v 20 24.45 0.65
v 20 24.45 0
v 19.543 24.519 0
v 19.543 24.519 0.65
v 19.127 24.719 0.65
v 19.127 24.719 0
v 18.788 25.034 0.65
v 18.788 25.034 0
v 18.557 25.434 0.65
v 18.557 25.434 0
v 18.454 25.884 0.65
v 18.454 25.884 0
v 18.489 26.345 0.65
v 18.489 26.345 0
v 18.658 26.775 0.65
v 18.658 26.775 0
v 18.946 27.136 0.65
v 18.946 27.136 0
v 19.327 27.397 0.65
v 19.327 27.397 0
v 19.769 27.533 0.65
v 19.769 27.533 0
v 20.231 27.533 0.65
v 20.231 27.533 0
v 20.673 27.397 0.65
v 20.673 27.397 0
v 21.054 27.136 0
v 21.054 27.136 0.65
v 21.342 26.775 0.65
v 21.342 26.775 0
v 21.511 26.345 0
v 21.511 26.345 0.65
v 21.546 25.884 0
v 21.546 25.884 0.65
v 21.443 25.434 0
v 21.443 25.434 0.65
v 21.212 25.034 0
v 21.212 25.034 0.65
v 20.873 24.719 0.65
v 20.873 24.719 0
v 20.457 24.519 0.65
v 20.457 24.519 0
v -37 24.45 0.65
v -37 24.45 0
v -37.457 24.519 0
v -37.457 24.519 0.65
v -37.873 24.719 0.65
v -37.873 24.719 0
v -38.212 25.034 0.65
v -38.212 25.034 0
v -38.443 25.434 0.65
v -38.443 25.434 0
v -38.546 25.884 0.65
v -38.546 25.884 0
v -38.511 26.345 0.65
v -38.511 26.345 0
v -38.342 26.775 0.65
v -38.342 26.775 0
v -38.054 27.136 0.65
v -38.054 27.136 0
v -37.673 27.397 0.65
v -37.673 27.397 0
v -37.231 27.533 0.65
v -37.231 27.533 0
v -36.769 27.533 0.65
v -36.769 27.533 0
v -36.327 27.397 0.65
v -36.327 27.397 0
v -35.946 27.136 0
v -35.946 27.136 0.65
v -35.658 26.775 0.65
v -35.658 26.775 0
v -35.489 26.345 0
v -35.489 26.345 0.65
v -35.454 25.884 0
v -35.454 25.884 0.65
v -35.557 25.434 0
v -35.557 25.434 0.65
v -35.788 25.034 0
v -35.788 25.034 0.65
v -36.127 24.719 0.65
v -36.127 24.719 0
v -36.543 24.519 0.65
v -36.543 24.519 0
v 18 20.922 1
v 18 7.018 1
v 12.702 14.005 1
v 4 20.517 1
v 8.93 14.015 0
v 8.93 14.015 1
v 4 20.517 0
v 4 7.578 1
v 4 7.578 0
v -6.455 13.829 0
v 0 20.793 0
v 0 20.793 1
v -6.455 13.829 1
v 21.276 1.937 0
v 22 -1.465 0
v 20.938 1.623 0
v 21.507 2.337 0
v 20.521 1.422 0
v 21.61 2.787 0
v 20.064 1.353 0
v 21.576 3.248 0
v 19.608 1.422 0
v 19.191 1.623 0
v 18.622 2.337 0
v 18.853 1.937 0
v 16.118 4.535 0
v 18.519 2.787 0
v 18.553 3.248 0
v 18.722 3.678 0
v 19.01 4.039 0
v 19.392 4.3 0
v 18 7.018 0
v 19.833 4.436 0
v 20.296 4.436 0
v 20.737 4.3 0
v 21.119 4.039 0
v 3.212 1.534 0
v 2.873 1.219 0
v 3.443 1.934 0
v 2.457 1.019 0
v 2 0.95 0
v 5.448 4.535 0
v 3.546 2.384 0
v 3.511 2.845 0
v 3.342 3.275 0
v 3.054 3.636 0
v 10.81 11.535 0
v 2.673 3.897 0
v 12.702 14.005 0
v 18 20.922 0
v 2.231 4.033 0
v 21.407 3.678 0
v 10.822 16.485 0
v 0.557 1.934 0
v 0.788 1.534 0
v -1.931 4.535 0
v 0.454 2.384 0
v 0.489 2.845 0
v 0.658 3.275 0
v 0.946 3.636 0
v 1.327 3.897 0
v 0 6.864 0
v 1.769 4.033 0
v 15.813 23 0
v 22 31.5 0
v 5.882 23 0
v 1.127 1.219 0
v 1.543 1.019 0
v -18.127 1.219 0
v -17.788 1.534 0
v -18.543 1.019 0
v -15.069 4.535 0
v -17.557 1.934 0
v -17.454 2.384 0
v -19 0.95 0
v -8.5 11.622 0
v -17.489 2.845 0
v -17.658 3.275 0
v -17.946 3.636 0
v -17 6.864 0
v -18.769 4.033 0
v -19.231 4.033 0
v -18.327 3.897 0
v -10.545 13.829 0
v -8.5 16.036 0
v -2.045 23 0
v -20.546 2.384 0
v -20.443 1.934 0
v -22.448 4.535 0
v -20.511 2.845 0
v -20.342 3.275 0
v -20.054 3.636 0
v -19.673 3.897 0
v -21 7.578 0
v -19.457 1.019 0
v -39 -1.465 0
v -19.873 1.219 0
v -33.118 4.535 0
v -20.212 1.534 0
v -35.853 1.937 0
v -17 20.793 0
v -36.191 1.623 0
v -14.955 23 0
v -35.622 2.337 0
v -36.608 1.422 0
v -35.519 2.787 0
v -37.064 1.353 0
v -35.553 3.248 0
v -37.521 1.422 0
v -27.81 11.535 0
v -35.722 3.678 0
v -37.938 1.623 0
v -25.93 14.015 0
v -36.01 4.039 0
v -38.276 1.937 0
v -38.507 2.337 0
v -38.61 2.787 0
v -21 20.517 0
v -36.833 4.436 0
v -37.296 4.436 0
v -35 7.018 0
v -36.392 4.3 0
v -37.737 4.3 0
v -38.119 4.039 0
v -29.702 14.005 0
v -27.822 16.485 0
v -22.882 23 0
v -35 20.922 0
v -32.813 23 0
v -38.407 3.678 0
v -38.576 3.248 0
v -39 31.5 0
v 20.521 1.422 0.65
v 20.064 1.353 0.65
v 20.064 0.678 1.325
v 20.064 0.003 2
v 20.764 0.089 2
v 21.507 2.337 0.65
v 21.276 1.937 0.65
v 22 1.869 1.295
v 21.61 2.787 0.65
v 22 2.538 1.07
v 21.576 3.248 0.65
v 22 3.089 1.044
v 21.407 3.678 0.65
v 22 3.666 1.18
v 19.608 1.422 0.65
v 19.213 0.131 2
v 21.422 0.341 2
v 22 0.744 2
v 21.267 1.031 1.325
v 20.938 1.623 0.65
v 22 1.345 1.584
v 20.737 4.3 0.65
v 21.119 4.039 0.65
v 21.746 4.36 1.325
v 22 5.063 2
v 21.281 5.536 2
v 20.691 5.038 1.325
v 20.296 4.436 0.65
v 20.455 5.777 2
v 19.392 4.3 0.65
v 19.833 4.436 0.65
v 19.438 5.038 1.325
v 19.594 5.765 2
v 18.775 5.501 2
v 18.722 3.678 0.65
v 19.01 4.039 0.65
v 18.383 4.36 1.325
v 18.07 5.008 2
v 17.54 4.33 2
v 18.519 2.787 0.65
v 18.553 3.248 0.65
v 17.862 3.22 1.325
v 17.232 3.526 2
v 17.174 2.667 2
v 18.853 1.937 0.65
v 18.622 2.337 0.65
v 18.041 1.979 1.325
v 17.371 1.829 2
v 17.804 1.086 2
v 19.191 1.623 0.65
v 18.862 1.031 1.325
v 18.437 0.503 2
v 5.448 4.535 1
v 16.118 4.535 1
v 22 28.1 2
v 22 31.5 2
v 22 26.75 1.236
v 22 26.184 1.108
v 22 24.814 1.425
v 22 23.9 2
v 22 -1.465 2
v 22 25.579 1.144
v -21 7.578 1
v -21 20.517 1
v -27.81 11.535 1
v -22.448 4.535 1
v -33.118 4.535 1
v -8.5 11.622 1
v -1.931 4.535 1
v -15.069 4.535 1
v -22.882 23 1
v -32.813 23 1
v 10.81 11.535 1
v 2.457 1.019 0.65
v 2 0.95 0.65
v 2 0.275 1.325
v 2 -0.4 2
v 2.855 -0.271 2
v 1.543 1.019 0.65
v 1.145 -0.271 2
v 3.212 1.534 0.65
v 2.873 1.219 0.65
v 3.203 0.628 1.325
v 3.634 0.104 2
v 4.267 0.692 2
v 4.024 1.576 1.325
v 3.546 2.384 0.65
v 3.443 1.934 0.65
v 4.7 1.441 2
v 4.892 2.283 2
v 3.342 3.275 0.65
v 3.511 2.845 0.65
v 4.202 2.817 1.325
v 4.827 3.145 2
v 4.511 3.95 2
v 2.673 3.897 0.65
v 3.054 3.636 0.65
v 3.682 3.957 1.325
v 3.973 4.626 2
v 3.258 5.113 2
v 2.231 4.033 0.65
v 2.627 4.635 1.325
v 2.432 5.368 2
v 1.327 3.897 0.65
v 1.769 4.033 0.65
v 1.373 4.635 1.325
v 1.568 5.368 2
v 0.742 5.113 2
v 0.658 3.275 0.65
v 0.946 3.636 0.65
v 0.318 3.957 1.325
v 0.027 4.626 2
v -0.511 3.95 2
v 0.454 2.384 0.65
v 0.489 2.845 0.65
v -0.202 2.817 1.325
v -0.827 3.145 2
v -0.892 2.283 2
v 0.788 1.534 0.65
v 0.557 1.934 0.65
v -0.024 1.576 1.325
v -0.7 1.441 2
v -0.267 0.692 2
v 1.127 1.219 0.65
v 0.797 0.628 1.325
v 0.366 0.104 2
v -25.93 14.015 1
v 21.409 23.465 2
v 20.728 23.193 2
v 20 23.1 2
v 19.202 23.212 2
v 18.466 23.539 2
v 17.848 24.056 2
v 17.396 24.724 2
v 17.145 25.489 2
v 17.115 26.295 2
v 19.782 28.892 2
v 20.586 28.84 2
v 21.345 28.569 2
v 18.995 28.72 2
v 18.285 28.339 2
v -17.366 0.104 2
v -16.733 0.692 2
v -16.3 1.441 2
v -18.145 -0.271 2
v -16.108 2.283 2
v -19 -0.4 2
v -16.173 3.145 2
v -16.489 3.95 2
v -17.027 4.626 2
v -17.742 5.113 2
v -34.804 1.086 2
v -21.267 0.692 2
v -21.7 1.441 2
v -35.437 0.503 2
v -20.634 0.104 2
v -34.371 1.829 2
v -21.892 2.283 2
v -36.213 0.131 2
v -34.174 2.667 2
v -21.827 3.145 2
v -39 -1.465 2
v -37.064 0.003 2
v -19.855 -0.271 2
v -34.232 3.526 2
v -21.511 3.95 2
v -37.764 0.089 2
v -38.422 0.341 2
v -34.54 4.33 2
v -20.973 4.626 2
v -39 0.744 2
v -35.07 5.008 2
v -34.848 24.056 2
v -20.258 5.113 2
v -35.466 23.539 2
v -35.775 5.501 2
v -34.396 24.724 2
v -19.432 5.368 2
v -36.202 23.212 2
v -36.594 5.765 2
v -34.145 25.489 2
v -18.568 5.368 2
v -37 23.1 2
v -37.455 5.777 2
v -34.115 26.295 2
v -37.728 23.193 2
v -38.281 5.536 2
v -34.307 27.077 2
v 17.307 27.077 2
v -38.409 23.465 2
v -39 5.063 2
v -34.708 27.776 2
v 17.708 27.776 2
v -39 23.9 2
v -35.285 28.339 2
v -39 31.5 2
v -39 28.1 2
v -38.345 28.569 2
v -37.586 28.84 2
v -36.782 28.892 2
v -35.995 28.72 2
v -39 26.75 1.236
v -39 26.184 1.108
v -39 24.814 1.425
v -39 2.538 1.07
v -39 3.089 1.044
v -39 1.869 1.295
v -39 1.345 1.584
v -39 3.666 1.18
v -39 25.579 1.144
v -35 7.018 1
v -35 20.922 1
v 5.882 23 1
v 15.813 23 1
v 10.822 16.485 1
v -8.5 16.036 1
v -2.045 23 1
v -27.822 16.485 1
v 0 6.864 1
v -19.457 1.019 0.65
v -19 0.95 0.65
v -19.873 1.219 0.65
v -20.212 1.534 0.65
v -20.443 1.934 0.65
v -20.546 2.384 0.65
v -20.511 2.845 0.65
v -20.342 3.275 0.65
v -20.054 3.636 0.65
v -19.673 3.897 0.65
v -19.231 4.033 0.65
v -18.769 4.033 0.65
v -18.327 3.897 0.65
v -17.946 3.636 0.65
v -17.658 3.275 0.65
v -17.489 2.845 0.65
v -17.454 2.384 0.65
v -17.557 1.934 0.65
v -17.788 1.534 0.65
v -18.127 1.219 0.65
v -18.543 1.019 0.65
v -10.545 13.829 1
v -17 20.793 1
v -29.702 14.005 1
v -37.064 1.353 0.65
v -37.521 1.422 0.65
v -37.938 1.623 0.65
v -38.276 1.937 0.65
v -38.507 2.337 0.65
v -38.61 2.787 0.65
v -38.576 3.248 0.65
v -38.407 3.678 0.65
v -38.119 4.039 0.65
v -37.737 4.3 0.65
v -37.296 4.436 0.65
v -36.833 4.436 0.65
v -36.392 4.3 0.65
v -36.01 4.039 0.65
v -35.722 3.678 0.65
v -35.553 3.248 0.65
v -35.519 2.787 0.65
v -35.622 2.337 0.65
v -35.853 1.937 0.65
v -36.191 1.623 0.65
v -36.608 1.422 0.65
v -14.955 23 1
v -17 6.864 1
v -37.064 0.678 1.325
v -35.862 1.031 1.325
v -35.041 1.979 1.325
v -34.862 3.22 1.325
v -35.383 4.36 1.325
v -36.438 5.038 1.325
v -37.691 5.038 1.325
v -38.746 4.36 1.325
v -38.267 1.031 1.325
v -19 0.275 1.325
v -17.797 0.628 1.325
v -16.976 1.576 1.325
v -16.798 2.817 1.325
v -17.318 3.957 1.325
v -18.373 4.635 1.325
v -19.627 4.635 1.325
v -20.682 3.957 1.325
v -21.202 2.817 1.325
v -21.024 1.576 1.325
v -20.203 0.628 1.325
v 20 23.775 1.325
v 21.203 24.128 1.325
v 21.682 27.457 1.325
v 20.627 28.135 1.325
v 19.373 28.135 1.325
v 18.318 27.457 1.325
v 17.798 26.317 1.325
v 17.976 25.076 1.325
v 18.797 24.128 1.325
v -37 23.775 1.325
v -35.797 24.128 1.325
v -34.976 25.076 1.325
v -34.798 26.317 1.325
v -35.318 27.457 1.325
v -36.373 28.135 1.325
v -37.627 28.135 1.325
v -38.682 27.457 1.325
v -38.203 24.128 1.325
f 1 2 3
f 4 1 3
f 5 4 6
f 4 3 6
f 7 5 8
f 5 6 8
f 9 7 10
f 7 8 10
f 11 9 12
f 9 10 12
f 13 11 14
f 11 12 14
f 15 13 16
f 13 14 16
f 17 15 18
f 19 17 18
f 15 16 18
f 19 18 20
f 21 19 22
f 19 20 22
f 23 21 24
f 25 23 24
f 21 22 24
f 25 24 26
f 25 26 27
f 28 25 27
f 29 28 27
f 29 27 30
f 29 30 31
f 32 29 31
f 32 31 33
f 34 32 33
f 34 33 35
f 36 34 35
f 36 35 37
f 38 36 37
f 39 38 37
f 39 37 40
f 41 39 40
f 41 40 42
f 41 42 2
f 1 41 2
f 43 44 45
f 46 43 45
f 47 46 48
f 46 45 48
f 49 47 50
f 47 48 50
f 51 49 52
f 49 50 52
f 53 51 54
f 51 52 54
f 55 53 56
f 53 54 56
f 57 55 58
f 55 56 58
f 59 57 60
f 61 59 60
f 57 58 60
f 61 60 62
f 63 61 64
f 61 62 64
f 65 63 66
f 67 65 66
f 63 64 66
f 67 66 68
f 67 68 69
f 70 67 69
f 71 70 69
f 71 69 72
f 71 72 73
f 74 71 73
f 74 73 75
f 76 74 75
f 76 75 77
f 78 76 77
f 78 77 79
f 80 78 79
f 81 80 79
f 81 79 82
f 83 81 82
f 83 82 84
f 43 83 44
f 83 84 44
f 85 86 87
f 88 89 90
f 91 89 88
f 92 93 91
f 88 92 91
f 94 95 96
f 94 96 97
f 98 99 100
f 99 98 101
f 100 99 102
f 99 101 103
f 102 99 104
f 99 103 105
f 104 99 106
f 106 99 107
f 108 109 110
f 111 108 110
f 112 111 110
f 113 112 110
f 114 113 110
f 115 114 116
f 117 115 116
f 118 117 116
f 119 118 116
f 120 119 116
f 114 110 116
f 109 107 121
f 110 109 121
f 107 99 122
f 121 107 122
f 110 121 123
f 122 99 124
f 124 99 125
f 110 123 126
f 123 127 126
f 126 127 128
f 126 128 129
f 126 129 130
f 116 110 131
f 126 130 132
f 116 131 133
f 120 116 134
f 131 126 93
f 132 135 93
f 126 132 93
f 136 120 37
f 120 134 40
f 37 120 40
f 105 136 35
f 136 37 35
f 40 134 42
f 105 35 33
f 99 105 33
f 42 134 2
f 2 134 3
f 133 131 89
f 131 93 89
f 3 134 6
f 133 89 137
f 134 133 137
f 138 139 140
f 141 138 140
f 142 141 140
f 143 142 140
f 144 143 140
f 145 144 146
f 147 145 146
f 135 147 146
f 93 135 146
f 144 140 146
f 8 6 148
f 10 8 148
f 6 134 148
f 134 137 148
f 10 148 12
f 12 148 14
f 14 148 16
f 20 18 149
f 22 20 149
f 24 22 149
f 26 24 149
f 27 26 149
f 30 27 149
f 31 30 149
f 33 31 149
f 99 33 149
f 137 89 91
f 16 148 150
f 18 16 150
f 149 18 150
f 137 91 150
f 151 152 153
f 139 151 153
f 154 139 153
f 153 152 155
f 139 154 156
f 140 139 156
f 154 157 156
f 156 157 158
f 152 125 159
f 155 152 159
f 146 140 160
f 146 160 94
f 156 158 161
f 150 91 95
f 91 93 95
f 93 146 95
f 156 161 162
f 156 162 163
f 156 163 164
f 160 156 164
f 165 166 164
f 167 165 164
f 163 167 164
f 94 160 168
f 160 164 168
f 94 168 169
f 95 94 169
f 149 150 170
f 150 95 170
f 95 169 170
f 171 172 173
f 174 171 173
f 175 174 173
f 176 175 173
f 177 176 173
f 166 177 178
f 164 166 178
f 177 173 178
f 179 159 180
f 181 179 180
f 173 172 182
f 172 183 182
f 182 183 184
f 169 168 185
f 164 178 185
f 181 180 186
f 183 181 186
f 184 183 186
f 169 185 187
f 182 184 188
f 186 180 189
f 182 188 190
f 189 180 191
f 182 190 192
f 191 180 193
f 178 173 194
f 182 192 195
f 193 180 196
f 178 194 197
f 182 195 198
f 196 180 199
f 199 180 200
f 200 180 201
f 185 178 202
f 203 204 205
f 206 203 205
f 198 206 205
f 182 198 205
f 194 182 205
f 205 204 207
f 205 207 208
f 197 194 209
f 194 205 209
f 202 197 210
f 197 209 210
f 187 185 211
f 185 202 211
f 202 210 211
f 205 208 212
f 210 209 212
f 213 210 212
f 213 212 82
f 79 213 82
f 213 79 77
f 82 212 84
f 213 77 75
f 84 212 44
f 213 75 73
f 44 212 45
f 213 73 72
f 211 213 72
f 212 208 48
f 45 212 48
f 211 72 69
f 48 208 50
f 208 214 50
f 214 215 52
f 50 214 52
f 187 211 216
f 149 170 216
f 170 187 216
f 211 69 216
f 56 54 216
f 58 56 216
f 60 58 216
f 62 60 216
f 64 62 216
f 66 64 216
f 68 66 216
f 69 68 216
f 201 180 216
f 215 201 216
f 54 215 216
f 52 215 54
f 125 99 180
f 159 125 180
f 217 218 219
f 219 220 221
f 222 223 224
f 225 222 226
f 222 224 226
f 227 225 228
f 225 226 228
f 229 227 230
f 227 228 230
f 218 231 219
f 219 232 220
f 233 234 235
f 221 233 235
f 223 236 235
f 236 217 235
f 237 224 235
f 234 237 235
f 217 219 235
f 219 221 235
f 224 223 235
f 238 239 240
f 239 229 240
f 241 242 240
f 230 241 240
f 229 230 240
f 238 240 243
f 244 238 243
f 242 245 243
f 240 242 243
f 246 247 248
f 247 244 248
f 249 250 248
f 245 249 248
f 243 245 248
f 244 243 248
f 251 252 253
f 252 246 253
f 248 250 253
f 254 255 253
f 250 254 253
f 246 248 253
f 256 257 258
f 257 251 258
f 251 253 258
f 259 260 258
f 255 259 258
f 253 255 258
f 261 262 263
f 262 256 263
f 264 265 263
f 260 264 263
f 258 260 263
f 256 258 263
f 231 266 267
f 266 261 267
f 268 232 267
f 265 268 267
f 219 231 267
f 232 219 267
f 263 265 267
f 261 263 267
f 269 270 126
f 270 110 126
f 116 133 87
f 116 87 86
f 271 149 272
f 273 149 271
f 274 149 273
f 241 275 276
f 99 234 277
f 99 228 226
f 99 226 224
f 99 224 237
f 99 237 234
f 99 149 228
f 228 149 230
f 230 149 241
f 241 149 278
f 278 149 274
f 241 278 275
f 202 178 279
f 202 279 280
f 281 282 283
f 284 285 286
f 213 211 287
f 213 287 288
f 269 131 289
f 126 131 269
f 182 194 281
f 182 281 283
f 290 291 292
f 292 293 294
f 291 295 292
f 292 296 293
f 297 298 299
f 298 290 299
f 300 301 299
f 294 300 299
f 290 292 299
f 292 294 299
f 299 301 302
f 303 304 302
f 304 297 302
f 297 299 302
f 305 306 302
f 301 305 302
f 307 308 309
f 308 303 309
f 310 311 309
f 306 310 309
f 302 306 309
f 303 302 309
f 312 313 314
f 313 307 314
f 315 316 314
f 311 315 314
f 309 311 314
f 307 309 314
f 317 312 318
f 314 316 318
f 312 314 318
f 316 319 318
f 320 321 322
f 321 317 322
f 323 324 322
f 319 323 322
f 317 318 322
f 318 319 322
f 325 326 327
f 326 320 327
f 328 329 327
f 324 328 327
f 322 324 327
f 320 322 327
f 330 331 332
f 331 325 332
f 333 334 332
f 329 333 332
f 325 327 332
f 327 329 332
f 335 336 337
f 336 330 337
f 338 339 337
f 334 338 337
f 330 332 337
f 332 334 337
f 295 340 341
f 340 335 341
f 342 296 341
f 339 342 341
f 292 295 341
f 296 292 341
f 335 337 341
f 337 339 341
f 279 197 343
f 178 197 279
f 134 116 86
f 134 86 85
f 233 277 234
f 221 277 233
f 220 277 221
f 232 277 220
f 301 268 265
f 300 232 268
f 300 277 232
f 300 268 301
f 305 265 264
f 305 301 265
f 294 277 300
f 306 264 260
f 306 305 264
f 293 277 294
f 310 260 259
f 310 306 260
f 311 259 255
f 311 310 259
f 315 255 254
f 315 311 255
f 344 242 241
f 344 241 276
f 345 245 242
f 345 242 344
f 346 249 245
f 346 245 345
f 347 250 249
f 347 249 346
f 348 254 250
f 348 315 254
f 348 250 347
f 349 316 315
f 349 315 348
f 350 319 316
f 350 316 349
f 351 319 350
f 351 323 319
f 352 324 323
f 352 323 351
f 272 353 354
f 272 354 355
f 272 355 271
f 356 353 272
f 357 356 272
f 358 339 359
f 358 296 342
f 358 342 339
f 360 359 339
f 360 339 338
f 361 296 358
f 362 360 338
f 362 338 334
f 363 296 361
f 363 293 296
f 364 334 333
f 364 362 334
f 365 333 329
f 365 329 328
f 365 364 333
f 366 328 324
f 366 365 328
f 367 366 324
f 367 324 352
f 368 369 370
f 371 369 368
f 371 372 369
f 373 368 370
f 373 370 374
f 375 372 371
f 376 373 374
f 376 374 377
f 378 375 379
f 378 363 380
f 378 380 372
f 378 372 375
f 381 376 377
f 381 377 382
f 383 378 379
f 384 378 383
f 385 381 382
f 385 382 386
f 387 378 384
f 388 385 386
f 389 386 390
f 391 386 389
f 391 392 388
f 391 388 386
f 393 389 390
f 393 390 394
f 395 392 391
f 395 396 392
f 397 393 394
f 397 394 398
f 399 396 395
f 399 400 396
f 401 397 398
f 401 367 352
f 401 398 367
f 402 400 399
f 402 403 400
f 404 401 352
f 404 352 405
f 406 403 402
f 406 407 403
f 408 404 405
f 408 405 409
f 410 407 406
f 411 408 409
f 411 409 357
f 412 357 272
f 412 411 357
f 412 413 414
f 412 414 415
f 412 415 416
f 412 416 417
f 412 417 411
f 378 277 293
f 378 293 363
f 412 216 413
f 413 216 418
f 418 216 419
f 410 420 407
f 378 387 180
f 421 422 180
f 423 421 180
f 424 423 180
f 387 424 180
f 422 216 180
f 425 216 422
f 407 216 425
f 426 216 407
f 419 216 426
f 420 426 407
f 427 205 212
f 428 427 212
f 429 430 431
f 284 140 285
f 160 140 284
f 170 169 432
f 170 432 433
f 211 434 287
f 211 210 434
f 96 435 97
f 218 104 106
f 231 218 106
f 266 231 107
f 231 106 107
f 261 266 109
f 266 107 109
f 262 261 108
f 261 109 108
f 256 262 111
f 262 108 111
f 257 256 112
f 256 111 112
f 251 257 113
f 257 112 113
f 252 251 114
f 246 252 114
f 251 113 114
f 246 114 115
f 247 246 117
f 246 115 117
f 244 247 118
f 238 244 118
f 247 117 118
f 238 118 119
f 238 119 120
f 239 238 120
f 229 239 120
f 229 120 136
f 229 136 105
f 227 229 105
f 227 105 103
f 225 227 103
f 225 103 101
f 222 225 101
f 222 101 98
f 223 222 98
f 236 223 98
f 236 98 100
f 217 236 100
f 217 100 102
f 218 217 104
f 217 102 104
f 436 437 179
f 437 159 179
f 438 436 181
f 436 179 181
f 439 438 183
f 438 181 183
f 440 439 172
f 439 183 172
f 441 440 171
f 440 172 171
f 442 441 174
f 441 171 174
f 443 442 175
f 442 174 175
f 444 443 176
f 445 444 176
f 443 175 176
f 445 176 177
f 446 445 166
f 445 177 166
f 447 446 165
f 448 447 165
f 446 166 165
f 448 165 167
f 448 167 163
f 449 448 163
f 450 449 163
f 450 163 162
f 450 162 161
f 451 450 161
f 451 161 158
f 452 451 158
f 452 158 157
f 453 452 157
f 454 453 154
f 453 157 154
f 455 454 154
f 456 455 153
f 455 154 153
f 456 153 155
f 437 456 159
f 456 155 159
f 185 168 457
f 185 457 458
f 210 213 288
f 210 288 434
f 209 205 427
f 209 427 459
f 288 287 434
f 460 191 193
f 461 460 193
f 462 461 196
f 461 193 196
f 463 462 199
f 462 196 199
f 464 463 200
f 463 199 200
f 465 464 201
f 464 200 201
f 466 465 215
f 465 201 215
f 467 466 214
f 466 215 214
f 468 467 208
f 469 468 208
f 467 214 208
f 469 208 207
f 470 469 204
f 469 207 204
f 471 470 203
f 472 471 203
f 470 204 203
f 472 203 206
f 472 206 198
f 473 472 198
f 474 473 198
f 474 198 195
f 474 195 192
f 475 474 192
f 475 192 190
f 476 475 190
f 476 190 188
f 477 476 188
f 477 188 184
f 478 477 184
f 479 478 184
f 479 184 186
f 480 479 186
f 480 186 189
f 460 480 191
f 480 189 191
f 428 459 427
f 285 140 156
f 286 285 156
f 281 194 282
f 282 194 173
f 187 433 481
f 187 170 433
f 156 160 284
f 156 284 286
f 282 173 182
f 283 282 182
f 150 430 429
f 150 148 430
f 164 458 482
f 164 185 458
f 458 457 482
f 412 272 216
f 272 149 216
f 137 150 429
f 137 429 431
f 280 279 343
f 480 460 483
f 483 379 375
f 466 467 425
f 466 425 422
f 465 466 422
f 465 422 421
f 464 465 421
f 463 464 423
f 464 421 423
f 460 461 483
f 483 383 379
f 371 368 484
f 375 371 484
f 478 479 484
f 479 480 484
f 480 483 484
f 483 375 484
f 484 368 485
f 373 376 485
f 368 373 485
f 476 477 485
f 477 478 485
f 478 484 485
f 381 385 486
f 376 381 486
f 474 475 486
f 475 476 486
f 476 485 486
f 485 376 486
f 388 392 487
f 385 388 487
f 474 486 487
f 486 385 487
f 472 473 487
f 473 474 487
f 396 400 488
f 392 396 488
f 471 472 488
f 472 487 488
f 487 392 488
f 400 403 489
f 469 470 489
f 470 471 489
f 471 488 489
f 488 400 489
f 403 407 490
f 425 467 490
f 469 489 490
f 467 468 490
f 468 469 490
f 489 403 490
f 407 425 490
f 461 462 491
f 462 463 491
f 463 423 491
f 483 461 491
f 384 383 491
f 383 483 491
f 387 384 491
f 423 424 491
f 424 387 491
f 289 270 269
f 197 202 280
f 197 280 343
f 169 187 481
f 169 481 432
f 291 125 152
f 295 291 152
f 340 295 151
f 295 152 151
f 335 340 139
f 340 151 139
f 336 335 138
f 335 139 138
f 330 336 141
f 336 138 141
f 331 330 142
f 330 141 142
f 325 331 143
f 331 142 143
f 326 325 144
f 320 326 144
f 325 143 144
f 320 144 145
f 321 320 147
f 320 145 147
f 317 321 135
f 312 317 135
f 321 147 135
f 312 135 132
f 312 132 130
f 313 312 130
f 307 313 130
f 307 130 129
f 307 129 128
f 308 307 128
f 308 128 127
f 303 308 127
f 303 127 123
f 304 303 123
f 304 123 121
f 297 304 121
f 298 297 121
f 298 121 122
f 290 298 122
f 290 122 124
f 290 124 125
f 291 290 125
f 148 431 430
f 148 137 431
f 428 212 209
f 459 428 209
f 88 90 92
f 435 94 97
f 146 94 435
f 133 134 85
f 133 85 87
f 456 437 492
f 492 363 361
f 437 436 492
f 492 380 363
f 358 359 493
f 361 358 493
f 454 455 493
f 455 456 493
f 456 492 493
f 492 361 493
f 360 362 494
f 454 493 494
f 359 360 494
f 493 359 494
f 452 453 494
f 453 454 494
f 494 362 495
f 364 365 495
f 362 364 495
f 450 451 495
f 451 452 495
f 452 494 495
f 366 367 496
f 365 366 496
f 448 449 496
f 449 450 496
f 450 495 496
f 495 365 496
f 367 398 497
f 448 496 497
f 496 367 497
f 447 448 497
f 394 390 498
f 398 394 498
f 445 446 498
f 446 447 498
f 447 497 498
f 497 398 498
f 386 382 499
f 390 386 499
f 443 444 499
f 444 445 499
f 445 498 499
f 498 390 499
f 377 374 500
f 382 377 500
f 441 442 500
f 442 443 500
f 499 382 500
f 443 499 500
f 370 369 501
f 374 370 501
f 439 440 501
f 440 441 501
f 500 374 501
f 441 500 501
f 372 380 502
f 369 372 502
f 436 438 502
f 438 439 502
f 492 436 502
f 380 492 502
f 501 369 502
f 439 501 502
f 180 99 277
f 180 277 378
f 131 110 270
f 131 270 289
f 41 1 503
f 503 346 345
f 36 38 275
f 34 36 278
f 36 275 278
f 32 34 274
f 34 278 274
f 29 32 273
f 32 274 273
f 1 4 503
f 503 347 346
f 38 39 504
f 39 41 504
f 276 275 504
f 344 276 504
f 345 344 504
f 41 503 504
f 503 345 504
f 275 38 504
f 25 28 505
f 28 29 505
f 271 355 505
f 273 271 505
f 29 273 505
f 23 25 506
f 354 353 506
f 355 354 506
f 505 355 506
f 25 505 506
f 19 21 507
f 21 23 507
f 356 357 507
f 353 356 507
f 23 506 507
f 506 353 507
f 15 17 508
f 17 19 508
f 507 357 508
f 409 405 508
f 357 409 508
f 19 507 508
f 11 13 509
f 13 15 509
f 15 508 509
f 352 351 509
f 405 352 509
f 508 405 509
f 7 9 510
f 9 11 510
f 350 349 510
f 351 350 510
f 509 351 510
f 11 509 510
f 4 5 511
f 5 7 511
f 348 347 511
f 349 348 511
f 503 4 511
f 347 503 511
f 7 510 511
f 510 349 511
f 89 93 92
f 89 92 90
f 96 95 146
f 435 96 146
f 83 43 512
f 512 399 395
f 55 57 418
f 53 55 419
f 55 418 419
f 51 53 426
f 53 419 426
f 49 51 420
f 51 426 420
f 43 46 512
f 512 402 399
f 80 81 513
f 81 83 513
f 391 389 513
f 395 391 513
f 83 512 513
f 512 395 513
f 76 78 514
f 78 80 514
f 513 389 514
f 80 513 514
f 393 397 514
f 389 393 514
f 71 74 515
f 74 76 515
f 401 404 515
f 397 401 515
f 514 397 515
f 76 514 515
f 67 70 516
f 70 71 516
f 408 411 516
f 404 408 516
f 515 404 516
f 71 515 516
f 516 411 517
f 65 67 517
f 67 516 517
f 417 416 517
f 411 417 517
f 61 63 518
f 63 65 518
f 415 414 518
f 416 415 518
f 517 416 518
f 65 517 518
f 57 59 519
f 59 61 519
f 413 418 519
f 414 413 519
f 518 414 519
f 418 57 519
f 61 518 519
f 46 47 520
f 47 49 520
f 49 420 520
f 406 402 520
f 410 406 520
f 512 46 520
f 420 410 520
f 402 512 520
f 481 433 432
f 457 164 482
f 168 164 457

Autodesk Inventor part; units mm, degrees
ref_plane "YZ Plane" through (0, 0, 0) normal (1, 0, 0) x (0, 1, 0)
ref_plane "XZ Plane" through (0, 0, 0) normal (0, 1, 0) x (-1, 0, 0)
ref_plane "Work Plane1" through (22, 31.5, 0) normal (0, 0, 1) x (0, 1, 0)
sketch "Sketch1" plane through (22, 31.5, 0) normal (0, 0, 1) x (0, 1, 0)
  line L0 (0, 0) -> (0, 61) projected
  line L1 (0, 61) -> (-3.5, 61) projected
  line L2 (-3.5, 0) -> (-3.5, 61) projected
  circle A0 centre (-5.5, 2) radius 1.75 projected
  circle A1 centre (-28.5, 2) radius 1.75 projected
  line L3 (-3.5, 4) -> (-7.5, 4) projected
  arc A2 (-8.5, 3) -> (-7.5, 4) centre (-8.5, 4) ccw projected
  line L4 (-8.5, 3) -> (-21.7679, 3) projected
  arc A3 (-23.5, 4) -> (-21.7679, 3) centre (-21.7679, 5) ccw projected
  line L5 (-23.5, 4) -> (-31.5, 4) projected
  line L6 (-31.5, 0) -> (-31.5, 4) projected
  line L7 (-3.5, 0) -> (-3.5, 4) projected
  line L8 (-19.5, 22) -> (-3.5, 22) projected
  line L9 (-3.5, 22) -> (-3.5, 18) projected
  line L10 (-19.5, 39) -> (-3.5, 39) projected
  line L11 (-3.5, 39) -> (-3.5, 43) projected
  line L12 (-3.5, 57) -> (-6.7679, 57) projected
  line L13 (-3.5, 61) -> (-3.5, 57) projected
  line L14 (-3.5, 61) -> (-31.5, 61) projected
  line L15 (-31.5, 61) -> (-31.5, 57) projected
  line L16 (-24.004, 57) -> (-31.5, 57) projected
  line L17 (0, 0) -> (-32.9649, 0)
  line L18 (-32.9649, 0) -> (-32.9649, 61)
  line L19 (-32.9649, 61) -> (0, 61)
  line L20 (0, 61) -> (0, 0)
  line L21 (-3.5, 0) -> (-31.5, 0)
  line L22 (-8.5, 58) -> (-21.7679, 58) projected
  arc A4 (-7.634, 57.5) -> (-6.7679, 57) centre (-6.7679, 58) ccw projected
  arc A5 (-24.004, 57) -> (-23.2587, 57.3333) centre (-24.004, 58) ccw projected
  arc A6 (-21.7679, 58) -> (-23.2587, 57.3333) centre (-21.7679, 56) ccw projected
  arc A7 (-7.634, 57.5) -> (-8.5, 58) centre (-8.5, 57) ccw projected
  line L23 (-19.5, 18) -> (-19.5, 22) projected
  line L24 (-19.5, 18) -> (-3.5, 18) projected
  line L25 (-19.5, 43) -> (-3.5, 43) projected
  line L26 (-19.5, 43) -> (-19.5, 39) projected
  circle A8 centre (-5.5, 59) radius 1.75 projected
  circle A9 centre (-28.5, 59) radius 1.75 projected
  line L27 (-32.9649, 119.5) -> (-32.9649, -58.5) projected
  point P0 (-3.5, 28.5)
  point P1 (-3.5, 32.5)
  point P2 (-3.5, 61)
  point P3 (-13.5, 58)
  dimension "d25" = 0
  dimension "d26" = 0
extrude "Extrusion1" add sketch "Sketch1" along normal blind 2 contours L17 L2 L1 L0 | L17 L6 L5 A3 L4 A2 L3 L2 | L2 L12 A4 A7 L22 A6 A5 L16 L15 L14 | L3 A2 L4 A3 L5 L6 L17 L18 L19 L15 L16 A5 A6 L22 A7 A4 L12 L2 L25 L26 L10 L8 L23 L24 | L24 L23 L8 L2 | L2 L10 L26 L25 | A0 | A1 | A8 | A9
hole "Hole1" at (20.0645, 2.9032, 2) at (20, 26, 2) at (2, 2.5, 2) at (-19, 2.5, 2) at (-37, 26, 2) at (-37.0645, 2.9032, 2) direction (0, 0, -1) diameter 3.1 end through all countersink diameter 5.8 countersink angle 90 clearance for "Countersunk Flat Head Screw ISO 2009/7046" size "M2.5" standard "ISO"
sketch "Sketch4" plane through (22, 31.5, 0) normal (0, 0, -1) x (-1, 0, 0)
  line L0 (39, -19.5) -> (39, -3.5)
  line L1 (39, -3.5) -> (43, -3.5)
  line L2 (43, -19.5) -> (43, -3.5)
  line L3 (43, -19.5) -> (39, -19.5)
  line L4 (22, -19.5) -> (22, -3.5)
  line L5 (18, -19.5) -> (22, -19.5)
  line L6 (18, -19.5) -> (18, -3.5)
  line L7 (22, -3.5) -> (18, -3.5)
  circle A0 centre (20, -29) radius 1.75
  line L8 (22, -31.5) -> (18, -31.5)
  line L9 (18, -31.5) -> (18, -19.5)
  line L10 (22, -19.5) -> (18, -19.5)
  line L11 (22, -19.5) -> (22, -31.5)
  circle A1 centre (41, -29) radius 1.75
  line L12 (39, -31.5) -> (43, -31.5)
  line L13 (39, -19.5) -> (39, -31.5)
  line L14 (39, -23.5) -> (43, -23.5)
  line L15 (43, -31.5) -> (43, -19.5)
  circle A2 centre (59, -5.5) radius 1.75
  circle A3 centre (59, -28.5) radius 1.75
  arc A4 (57, -6.7679) -> (57.5, -7.634) centre (58, -6.7679) ccw
  line L16 (57, -3.5) -> (57, -6.7679)
  line L17 (61, -3.5) -> (57, -3.5)
  line L18 (61, -3.5) -> (61, -31.5)
  line L19 (61, -31.5) -> (57, -31.5)
  line L20 (57, -24.004) -> (57, -31.5)
  arc A5 (57.3333, -23.2587) -> (57, -24.004) centre (58, -24.004) ccw
  arc A6 (57.3333, -23.2587) -> (58, -21.7679) centre (56, -21.7679) ccw
  line L21 (58, -8.5) -> (58, -21.7679)
  arc A7 (58, -8.5) -> (57.5, -7.634) centre (57, -8.5) ccw
  line L22 (61, -32.9649) -> (0, -32.9649)
  line L23 (0, -32.9649) -> (0, 0)
  line L24 (61, -32.9649) -> (0, -32.9649)
  line L25 (0, -32.9649) -> (0, -26.9649)
  line L26 (0, -26.9649) -> (61, -26.9649)
  line L27 (61, -26.9649) -> (61, -32.9649)
  line L28 (61, 0) -> (61, -32.9649)
  line L29 (0, -8.5) -> (61, -8.5)
  line L30 (61, -8.5) -> (61, -2.5)
  line L31 (61, -2.5) -> (0, -2.5)
  line L32 (0, -2.5) -> (0, -8.5)
  circle A8 centre (41, -29) radius 1.55
  line L33 (59, -5.5) -> (41, -29) construction
  line L34 (2, -5.5) -> (20, -29) construction
  circle A9 centre (41, -29) radius 2.9
  circle A10 centre (1.9355, -28.5968) radius 1.55
  line L35 (57, -26.9649) -> (57, -8.5)
  line L36 (4, -26.9649) -> (4, -8.5)
  line L37 (57, -10.5779) -> (44.4482, -26.9649)
  line L38 (54.8127, -8.5) -> (40.6693, -26.9649)
  line L39 (20.3307, -26.9649) -> (6.1873, -8.5)
  line L40 (4, -10.5779) -> (16.5518, -26.9649)
  circle A11 centre (20, -29) radius 2.9
  line L41 (61, -32.9649) -> (0, -32.9649)
  line L42 (0, -32.9649) -> (0, -30.7564)
  line L43 (0, 0) -> (61, 0)
  line L44 (61, 0) -> (61, -3.4)
  circle A12 centre (41, -29) radius 2.9
  arc A13 (61, -26.4372) -> (61, -30.7564) centre (59.0645, -28.5968) ccw
  arc A14 (0, -7.6) -> (0, -3.4) centre (2, -5.5) ccw
  arc A15 (0, -30.7564) -> (0, -26.4372) centre (1.9355, -28.5968) ccw
  arc A16 (61, -3.4) -> (61, -7.6) centre (59, -5.5) ccw
  line L45 (61, -7.6) -> (61, -26.4372)
  line L46 (61, -30.7564) -> (61, -32.9649)
  line L47 (0, -26.4372) -> (0, -7.6)
  line L48 (0, -3.4) -> (0, 0)
  line L49 (61, -3.5) -> (57, -3.5)
  line L50 (61, -3.5) -> (61, -31.5)
  line L51 (61, -31.5) -> (57, -31.5)
  line L52 (57, -3.5) -> (57, -31.5)
  line L53 (4, -26.9649) -> (18, -8.5) construction
  line L54 (57, -26.9649) -> (43, -8.5) construction
  line L55 (57, -24.4822) -> (44.8824, -8.5)
  line L56 (43, -10.9827) -> (55.1176, -26.9649)
  line L57 (5.8824, -26.9649) -> (18, -10.9827)
  line L58 (16.1176, -8.5) -> (4, -24.4822)
  circle A17 centre (41, -29) radius 1.55
  line L59 (22, -8.5) -> (41, -29) construction
  line L60 (39, -8.5) -> (20, -29) construction
  line L61 (39, -24.6355) -> (24.0452, -8.5)
  line L62 (22, -10.7066) -> (37.0687, -26.9649)
  line L63 (23.9313, -26.9649) -> (39, -10.7066)
  line L64 (36.9548, -8.5) -> (22, -24.6355)
  point P0 (42.4697, -31.5)
  point P1 (39.5303, -31.5)
  point P2 (18, -23.9221)
  point P3 (18, -8.5)
  point P4 (22, -8.5)
  point P5 (39, -8.5)
  point P6 (43, -23.9221)
  point P7 (0, -2.5)
  point P8 (28.4548, -17.6711)
  point P9 (30.5, -15.4644)
  point P10 (30.5, -19.8777)
  point P11 (49.8222, -15.0153)
  point P12 (47.9303, -17.4854)
  point P13 (57, -26.5602)
  point P14 (56.6672, -26.9649)
  point P15 (51.7021, -17.4946)
  point P16 (49.8101, -19.9647)
  point P17 (13.0697, -17.4854)
  point P18 (11.1778, -15.0153)
  point P19 (11.1899, -19.9647)
  point P20 (4.3328, -26.9649)
  point P21 (4, -26.5602)
  point P22 (9.2979, -17.4946)
  point P23 (32.5452, -17.6711)
extrude "zeberka" cut sketch "Sketch4" against normal blind 1 contours L13 L61 L63 L0 | L2 L56 L38 L15 | L64 L61 L29 | L62 L26 L63 | L29 L38 L55 | L64 L11 L4 L62 | L56 L26 L37 | L37 L35 L20 L55 | L6 L9 L39 L57 | L58 L39 L29 | L40 L26 L57 | L58 L36 L40
properties part number "back" material "Nylon 6/6"
